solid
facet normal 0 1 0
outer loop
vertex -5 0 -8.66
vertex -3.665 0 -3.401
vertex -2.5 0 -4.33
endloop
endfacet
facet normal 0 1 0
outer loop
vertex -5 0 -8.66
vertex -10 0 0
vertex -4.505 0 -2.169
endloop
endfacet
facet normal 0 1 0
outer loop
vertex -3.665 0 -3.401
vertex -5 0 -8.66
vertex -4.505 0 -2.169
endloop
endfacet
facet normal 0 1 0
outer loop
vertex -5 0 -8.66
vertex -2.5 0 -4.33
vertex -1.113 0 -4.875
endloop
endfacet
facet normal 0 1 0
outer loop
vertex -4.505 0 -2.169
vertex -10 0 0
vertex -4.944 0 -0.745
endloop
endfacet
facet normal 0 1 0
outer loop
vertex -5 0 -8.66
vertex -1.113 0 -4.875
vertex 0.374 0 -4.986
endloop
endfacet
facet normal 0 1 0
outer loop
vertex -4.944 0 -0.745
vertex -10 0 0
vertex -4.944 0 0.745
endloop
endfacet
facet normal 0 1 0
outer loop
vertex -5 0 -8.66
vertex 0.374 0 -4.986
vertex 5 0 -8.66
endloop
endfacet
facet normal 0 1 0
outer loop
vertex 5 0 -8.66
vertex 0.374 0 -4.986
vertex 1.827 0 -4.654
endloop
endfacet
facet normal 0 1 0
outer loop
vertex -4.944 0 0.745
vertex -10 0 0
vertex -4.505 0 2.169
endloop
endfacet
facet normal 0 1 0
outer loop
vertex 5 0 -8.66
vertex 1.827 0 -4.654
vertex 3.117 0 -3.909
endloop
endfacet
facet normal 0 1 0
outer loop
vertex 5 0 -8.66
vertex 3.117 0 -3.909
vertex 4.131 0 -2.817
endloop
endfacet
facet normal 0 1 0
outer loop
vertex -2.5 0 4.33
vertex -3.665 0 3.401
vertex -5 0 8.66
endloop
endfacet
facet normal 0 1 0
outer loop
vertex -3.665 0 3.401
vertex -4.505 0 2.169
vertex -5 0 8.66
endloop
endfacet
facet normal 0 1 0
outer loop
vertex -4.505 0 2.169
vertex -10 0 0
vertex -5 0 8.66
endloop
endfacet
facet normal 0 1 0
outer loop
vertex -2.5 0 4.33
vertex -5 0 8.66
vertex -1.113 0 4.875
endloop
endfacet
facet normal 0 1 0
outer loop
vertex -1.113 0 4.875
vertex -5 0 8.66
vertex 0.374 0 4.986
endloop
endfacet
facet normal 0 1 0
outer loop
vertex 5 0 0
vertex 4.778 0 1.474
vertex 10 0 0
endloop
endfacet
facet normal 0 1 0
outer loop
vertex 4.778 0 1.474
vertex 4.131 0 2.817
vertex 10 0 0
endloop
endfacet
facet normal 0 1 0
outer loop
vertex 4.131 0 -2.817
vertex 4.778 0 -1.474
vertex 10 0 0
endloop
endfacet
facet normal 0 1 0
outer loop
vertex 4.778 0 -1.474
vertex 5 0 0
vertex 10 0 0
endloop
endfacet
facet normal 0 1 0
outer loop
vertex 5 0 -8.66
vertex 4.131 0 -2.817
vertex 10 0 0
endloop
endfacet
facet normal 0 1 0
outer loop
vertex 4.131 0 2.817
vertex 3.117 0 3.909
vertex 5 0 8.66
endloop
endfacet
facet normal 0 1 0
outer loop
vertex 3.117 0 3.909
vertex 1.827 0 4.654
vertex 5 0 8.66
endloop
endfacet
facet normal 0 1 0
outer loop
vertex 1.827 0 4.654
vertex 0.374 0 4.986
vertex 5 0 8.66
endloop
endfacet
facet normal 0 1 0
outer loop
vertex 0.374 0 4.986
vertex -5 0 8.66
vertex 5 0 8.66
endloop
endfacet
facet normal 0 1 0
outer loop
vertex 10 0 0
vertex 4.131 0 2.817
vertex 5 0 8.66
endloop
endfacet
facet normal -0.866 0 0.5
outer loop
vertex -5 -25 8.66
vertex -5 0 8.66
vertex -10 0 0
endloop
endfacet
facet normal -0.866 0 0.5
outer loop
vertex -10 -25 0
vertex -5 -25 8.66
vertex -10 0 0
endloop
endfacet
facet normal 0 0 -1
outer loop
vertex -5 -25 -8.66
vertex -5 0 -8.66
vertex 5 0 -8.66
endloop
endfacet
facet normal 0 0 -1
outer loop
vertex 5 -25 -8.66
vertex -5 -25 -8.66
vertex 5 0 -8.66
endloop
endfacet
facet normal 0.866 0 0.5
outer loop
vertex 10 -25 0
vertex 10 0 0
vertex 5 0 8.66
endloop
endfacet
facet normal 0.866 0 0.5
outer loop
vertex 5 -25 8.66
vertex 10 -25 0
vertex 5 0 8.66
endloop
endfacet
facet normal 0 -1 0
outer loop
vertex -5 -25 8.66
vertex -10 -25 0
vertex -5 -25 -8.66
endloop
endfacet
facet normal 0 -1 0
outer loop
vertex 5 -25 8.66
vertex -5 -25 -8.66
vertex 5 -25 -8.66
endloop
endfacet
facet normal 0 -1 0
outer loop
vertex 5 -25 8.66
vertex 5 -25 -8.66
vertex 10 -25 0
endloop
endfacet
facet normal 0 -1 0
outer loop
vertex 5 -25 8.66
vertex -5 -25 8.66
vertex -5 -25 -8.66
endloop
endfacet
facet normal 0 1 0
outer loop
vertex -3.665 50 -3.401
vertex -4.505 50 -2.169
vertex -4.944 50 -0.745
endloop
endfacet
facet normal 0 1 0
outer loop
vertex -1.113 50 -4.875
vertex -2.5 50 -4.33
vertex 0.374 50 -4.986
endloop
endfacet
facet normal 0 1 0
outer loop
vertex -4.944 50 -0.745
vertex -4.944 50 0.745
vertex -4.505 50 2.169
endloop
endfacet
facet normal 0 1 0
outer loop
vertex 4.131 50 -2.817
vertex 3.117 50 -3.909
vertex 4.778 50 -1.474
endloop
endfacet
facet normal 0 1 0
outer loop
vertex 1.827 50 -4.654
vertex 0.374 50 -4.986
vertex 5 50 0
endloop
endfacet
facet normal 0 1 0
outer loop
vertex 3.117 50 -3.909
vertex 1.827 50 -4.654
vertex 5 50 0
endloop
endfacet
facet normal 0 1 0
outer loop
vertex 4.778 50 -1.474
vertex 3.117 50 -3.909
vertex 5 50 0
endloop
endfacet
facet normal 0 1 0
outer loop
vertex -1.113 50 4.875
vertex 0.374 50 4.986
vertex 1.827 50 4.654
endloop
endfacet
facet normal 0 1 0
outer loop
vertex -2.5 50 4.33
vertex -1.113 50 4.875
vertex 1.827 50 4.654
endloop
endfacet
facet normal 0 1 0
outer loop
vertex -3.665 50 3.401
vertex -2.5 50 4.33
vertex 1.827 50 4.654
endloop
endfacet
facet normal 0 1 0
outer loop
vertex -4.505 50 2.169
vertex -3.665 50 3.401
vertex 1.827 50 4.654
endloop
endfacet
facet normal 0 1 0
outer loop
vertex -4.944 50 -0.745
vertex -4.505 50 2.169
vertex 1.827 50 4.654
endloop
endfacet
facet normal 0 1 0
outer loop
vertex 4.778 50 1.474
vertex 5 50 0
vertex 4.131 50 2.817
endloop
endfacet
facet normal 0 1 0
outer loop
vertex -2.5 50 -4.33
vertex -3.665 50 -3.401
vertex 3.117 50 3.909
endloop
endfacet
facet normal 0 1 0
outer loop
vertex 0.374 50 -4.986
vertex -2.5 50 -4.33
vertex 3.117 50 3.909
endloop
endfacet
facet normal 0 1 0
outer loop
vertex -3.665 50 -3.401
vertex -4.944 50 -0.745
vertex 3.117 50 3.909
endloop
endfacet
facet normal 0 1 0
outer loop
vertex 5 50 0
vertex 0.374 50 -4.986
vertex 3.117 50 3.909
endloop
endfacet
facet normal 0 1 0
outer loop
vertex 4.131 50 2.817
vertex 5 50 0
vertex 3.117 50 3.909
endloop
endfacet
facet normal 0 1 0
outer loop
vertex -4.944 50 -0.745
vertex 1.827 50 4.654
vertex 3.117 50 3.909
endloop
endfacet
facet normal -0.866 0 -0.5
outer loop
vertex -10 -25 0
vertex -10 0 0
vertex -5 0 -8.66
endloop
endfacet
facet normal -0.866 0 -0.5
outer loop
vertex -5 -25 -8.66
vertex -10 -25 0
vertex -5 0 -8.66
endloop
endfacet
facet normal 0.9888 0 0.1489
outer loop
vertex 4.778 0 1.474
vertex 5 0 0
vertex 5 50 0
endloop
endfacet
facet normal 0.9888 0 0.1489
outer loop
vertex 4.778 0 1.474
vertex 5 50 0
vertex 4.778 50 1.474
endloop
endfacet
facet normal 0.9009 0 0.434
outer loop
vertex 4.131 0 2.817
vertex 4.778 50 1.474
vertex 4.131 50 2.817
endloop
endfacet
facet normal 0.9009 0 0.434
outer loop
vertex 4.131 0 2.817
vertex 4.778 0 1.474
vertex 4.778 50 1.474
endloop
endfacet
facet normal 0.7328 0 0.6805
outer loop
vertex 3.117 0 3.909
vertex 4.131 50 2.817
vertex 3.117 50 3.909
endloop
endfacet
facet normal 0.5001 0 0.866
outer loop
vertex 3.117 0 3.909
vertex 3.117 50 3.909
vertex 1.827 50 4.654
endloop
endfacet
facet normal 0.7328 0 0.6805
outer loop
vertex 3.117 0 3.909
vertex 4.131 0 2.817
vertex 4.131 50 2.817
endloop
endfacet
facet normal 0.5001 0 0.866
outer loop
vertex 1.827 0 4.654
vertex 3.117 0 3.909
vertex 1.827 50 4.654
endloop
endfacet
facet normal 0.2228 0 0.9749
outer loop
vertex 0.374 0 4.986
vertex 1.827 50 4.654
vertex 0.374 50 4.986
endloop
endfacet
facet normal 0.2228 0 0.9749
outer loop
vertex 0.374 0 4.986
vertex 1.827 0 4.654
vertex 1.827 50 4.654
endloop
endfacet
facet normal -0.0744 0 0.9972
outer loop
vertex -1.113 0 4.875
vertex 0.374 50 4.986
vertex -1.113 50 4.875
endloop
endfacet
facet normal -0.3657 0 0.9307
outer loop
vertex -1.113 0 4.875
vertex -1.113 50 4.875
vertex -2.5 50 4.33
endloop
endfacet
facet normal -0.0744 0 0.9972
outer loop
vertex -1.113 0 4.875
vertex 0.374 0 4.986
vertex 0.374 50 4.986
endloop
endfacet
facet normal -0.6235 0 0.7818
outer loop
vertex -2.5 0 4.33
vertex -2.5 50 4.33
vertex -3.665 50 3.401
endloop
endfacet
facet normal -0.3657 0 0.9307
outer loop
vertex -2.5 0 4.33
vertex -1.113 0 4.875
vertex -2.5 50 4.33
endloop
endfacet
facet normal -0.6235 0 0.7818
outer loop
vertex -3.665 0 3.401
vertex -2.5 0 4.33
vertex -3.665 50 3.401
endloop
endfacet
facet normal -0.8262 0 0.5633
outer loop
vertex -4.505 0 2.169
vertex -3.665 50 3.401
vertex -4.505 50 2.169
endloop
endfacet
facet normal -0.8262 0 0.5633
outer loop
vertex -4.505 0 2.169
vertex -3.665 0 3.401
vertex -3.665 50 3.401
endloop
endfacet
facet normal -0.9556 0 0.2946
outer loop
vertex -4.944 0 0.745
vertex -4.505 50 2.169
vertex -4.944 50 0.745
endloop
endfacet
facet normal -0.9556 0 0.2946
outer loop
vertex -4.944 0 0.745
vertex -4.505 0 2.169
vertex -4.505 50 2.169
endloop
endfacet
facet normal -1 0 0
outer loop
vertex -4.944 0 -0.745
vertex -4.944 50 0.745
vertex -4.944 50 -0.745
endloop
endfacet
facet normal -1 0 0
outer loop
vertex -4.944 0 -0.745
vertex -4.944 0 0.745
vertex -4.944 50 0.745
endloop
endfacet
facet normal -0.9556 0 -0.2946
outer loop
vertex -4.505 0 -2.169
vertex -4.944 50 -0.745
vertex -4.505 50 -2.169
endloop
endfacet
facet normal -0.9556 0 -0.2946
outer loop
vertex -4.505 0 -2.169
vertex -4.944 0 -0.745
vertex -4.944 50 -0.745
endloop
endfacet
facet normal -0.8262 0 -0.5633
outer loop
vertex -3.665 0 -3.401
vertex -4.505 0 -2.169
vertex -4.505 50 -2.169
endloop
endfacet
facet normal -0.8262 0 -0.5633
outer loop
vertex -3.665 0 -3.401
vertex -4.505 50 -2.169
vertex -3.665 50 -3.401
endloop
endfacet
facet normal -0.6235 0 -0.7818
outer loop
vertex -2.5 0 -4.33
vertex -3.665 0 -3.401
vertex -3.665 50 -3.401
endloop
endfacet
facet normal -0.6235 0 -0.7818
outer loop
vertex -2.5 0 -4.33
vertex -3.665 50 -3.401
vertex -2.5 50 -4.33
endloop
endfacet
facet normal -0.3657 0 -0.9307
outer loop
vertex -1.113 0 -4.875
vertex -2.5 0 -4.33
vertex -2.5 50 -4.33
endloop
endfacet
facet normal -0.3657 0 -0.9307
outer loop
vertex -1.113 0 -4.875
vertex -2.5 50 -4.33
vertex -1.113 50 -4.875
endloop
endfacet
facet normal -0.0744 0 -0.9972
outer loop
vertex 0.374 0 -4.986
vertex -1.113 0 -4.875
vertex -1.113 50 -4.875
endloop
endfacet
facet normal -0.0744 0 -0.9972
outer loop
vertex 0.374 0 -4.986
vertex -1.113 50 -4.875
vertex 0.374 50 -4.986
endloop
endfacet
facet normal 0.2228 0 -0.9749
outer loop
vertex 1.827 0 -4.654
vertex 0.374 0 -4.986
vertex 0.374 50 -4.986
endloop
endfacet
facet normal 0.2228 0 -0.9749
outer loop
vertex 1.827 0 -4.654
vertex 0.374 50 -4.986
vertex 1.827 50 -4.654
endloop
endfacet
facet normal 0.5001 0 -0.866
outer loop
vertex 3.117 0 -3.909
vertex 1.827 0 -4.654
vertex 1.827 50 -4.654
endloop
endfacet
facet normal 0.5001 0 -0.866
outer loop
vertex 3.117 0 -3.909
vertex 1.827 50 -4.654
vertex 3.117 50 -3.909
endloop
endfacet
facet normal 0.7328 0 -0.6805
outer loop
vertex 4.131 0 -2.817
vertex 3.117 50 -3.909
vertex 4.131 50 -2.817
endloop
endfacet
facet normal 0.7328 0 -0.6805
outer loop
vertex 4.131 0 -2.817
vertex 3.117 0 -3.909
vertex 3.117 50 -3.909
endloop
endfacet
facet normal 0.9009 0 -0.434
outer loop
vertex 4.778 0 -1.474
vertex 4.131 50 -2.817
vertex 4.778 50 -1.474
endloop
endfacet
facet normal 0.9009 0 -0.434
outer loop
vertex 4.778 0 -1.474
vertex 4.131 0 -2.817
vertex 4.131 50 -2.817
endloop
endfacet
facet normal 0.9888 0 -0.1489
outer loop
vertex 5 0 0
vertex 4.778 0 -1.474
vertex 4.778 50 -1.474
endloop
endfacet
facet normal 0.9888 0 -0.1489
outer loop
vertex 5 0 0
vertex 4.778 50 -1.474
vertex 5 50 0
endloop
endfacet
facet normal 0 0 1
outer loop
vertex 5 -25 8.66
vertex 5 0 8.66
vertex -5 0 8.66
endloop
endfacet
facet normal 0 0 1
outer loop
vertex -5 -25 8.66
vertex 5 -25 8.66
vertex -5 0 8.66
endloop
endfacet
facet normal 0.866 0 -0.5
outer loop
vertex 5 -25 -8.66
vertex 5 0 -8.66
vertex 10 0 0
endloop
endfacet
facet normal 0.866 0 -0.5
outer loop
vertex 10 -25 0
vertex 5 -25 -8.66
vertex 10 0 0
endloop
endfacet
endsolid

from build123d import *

# Parameters (mm, degrees)
F1_DEPTH = 25
F2_DEPTH = 50


with BuildPart() as f1:
    # F0 (on Front) → F1 (new body)
    with BuildSketch(Plane.XZ):
        Polygon((-5, 0), (-5, 8.66), (-10.00044, 0), (-5, -8.66), align=None)
        with BuildLine():
            Line((5, -8.66), (5, 0))
            ThreePointArc((5, 0), (0, -5), (-5, 0))
            Line((-5, 0), (-5, -8.66))
            Line((-5, -8.66), (5, -8.66))
        make_face()
        with BuildLine():
            ThreePointArc((-5, 0), (0, -5), (5, 0))
            ThreePointArc((5, 0), (0, 5), (-5, 0))
        make_face()
        with BuildLine():
            Line((5, 0), (5, 8.66))
            Line((5, 8.66), (-5, 8.66))
            Line((-5, 8.66), (-5, 0))
            ThreePointArc((-5, 0), (0, 5), (5, 0))
        make_face()
        Polygon((10.00044, 0), (5, 8.66), (5, 0), (5, -8.66), align=None)
    extrude(amount=F1_DEPTH)

    # F0 (on Front) → F2 (join)
    with BuildSketch(Plane.XZ):
        with BuildLine():
            ThreePointArc((-5, 0), (0, -5), (5, 0))
            ThreePointArc((5, 0), (0, 5), (-5, 0))
        make_face()
    extrude(amount=-F2_DEPTH)


solid = f1.part
